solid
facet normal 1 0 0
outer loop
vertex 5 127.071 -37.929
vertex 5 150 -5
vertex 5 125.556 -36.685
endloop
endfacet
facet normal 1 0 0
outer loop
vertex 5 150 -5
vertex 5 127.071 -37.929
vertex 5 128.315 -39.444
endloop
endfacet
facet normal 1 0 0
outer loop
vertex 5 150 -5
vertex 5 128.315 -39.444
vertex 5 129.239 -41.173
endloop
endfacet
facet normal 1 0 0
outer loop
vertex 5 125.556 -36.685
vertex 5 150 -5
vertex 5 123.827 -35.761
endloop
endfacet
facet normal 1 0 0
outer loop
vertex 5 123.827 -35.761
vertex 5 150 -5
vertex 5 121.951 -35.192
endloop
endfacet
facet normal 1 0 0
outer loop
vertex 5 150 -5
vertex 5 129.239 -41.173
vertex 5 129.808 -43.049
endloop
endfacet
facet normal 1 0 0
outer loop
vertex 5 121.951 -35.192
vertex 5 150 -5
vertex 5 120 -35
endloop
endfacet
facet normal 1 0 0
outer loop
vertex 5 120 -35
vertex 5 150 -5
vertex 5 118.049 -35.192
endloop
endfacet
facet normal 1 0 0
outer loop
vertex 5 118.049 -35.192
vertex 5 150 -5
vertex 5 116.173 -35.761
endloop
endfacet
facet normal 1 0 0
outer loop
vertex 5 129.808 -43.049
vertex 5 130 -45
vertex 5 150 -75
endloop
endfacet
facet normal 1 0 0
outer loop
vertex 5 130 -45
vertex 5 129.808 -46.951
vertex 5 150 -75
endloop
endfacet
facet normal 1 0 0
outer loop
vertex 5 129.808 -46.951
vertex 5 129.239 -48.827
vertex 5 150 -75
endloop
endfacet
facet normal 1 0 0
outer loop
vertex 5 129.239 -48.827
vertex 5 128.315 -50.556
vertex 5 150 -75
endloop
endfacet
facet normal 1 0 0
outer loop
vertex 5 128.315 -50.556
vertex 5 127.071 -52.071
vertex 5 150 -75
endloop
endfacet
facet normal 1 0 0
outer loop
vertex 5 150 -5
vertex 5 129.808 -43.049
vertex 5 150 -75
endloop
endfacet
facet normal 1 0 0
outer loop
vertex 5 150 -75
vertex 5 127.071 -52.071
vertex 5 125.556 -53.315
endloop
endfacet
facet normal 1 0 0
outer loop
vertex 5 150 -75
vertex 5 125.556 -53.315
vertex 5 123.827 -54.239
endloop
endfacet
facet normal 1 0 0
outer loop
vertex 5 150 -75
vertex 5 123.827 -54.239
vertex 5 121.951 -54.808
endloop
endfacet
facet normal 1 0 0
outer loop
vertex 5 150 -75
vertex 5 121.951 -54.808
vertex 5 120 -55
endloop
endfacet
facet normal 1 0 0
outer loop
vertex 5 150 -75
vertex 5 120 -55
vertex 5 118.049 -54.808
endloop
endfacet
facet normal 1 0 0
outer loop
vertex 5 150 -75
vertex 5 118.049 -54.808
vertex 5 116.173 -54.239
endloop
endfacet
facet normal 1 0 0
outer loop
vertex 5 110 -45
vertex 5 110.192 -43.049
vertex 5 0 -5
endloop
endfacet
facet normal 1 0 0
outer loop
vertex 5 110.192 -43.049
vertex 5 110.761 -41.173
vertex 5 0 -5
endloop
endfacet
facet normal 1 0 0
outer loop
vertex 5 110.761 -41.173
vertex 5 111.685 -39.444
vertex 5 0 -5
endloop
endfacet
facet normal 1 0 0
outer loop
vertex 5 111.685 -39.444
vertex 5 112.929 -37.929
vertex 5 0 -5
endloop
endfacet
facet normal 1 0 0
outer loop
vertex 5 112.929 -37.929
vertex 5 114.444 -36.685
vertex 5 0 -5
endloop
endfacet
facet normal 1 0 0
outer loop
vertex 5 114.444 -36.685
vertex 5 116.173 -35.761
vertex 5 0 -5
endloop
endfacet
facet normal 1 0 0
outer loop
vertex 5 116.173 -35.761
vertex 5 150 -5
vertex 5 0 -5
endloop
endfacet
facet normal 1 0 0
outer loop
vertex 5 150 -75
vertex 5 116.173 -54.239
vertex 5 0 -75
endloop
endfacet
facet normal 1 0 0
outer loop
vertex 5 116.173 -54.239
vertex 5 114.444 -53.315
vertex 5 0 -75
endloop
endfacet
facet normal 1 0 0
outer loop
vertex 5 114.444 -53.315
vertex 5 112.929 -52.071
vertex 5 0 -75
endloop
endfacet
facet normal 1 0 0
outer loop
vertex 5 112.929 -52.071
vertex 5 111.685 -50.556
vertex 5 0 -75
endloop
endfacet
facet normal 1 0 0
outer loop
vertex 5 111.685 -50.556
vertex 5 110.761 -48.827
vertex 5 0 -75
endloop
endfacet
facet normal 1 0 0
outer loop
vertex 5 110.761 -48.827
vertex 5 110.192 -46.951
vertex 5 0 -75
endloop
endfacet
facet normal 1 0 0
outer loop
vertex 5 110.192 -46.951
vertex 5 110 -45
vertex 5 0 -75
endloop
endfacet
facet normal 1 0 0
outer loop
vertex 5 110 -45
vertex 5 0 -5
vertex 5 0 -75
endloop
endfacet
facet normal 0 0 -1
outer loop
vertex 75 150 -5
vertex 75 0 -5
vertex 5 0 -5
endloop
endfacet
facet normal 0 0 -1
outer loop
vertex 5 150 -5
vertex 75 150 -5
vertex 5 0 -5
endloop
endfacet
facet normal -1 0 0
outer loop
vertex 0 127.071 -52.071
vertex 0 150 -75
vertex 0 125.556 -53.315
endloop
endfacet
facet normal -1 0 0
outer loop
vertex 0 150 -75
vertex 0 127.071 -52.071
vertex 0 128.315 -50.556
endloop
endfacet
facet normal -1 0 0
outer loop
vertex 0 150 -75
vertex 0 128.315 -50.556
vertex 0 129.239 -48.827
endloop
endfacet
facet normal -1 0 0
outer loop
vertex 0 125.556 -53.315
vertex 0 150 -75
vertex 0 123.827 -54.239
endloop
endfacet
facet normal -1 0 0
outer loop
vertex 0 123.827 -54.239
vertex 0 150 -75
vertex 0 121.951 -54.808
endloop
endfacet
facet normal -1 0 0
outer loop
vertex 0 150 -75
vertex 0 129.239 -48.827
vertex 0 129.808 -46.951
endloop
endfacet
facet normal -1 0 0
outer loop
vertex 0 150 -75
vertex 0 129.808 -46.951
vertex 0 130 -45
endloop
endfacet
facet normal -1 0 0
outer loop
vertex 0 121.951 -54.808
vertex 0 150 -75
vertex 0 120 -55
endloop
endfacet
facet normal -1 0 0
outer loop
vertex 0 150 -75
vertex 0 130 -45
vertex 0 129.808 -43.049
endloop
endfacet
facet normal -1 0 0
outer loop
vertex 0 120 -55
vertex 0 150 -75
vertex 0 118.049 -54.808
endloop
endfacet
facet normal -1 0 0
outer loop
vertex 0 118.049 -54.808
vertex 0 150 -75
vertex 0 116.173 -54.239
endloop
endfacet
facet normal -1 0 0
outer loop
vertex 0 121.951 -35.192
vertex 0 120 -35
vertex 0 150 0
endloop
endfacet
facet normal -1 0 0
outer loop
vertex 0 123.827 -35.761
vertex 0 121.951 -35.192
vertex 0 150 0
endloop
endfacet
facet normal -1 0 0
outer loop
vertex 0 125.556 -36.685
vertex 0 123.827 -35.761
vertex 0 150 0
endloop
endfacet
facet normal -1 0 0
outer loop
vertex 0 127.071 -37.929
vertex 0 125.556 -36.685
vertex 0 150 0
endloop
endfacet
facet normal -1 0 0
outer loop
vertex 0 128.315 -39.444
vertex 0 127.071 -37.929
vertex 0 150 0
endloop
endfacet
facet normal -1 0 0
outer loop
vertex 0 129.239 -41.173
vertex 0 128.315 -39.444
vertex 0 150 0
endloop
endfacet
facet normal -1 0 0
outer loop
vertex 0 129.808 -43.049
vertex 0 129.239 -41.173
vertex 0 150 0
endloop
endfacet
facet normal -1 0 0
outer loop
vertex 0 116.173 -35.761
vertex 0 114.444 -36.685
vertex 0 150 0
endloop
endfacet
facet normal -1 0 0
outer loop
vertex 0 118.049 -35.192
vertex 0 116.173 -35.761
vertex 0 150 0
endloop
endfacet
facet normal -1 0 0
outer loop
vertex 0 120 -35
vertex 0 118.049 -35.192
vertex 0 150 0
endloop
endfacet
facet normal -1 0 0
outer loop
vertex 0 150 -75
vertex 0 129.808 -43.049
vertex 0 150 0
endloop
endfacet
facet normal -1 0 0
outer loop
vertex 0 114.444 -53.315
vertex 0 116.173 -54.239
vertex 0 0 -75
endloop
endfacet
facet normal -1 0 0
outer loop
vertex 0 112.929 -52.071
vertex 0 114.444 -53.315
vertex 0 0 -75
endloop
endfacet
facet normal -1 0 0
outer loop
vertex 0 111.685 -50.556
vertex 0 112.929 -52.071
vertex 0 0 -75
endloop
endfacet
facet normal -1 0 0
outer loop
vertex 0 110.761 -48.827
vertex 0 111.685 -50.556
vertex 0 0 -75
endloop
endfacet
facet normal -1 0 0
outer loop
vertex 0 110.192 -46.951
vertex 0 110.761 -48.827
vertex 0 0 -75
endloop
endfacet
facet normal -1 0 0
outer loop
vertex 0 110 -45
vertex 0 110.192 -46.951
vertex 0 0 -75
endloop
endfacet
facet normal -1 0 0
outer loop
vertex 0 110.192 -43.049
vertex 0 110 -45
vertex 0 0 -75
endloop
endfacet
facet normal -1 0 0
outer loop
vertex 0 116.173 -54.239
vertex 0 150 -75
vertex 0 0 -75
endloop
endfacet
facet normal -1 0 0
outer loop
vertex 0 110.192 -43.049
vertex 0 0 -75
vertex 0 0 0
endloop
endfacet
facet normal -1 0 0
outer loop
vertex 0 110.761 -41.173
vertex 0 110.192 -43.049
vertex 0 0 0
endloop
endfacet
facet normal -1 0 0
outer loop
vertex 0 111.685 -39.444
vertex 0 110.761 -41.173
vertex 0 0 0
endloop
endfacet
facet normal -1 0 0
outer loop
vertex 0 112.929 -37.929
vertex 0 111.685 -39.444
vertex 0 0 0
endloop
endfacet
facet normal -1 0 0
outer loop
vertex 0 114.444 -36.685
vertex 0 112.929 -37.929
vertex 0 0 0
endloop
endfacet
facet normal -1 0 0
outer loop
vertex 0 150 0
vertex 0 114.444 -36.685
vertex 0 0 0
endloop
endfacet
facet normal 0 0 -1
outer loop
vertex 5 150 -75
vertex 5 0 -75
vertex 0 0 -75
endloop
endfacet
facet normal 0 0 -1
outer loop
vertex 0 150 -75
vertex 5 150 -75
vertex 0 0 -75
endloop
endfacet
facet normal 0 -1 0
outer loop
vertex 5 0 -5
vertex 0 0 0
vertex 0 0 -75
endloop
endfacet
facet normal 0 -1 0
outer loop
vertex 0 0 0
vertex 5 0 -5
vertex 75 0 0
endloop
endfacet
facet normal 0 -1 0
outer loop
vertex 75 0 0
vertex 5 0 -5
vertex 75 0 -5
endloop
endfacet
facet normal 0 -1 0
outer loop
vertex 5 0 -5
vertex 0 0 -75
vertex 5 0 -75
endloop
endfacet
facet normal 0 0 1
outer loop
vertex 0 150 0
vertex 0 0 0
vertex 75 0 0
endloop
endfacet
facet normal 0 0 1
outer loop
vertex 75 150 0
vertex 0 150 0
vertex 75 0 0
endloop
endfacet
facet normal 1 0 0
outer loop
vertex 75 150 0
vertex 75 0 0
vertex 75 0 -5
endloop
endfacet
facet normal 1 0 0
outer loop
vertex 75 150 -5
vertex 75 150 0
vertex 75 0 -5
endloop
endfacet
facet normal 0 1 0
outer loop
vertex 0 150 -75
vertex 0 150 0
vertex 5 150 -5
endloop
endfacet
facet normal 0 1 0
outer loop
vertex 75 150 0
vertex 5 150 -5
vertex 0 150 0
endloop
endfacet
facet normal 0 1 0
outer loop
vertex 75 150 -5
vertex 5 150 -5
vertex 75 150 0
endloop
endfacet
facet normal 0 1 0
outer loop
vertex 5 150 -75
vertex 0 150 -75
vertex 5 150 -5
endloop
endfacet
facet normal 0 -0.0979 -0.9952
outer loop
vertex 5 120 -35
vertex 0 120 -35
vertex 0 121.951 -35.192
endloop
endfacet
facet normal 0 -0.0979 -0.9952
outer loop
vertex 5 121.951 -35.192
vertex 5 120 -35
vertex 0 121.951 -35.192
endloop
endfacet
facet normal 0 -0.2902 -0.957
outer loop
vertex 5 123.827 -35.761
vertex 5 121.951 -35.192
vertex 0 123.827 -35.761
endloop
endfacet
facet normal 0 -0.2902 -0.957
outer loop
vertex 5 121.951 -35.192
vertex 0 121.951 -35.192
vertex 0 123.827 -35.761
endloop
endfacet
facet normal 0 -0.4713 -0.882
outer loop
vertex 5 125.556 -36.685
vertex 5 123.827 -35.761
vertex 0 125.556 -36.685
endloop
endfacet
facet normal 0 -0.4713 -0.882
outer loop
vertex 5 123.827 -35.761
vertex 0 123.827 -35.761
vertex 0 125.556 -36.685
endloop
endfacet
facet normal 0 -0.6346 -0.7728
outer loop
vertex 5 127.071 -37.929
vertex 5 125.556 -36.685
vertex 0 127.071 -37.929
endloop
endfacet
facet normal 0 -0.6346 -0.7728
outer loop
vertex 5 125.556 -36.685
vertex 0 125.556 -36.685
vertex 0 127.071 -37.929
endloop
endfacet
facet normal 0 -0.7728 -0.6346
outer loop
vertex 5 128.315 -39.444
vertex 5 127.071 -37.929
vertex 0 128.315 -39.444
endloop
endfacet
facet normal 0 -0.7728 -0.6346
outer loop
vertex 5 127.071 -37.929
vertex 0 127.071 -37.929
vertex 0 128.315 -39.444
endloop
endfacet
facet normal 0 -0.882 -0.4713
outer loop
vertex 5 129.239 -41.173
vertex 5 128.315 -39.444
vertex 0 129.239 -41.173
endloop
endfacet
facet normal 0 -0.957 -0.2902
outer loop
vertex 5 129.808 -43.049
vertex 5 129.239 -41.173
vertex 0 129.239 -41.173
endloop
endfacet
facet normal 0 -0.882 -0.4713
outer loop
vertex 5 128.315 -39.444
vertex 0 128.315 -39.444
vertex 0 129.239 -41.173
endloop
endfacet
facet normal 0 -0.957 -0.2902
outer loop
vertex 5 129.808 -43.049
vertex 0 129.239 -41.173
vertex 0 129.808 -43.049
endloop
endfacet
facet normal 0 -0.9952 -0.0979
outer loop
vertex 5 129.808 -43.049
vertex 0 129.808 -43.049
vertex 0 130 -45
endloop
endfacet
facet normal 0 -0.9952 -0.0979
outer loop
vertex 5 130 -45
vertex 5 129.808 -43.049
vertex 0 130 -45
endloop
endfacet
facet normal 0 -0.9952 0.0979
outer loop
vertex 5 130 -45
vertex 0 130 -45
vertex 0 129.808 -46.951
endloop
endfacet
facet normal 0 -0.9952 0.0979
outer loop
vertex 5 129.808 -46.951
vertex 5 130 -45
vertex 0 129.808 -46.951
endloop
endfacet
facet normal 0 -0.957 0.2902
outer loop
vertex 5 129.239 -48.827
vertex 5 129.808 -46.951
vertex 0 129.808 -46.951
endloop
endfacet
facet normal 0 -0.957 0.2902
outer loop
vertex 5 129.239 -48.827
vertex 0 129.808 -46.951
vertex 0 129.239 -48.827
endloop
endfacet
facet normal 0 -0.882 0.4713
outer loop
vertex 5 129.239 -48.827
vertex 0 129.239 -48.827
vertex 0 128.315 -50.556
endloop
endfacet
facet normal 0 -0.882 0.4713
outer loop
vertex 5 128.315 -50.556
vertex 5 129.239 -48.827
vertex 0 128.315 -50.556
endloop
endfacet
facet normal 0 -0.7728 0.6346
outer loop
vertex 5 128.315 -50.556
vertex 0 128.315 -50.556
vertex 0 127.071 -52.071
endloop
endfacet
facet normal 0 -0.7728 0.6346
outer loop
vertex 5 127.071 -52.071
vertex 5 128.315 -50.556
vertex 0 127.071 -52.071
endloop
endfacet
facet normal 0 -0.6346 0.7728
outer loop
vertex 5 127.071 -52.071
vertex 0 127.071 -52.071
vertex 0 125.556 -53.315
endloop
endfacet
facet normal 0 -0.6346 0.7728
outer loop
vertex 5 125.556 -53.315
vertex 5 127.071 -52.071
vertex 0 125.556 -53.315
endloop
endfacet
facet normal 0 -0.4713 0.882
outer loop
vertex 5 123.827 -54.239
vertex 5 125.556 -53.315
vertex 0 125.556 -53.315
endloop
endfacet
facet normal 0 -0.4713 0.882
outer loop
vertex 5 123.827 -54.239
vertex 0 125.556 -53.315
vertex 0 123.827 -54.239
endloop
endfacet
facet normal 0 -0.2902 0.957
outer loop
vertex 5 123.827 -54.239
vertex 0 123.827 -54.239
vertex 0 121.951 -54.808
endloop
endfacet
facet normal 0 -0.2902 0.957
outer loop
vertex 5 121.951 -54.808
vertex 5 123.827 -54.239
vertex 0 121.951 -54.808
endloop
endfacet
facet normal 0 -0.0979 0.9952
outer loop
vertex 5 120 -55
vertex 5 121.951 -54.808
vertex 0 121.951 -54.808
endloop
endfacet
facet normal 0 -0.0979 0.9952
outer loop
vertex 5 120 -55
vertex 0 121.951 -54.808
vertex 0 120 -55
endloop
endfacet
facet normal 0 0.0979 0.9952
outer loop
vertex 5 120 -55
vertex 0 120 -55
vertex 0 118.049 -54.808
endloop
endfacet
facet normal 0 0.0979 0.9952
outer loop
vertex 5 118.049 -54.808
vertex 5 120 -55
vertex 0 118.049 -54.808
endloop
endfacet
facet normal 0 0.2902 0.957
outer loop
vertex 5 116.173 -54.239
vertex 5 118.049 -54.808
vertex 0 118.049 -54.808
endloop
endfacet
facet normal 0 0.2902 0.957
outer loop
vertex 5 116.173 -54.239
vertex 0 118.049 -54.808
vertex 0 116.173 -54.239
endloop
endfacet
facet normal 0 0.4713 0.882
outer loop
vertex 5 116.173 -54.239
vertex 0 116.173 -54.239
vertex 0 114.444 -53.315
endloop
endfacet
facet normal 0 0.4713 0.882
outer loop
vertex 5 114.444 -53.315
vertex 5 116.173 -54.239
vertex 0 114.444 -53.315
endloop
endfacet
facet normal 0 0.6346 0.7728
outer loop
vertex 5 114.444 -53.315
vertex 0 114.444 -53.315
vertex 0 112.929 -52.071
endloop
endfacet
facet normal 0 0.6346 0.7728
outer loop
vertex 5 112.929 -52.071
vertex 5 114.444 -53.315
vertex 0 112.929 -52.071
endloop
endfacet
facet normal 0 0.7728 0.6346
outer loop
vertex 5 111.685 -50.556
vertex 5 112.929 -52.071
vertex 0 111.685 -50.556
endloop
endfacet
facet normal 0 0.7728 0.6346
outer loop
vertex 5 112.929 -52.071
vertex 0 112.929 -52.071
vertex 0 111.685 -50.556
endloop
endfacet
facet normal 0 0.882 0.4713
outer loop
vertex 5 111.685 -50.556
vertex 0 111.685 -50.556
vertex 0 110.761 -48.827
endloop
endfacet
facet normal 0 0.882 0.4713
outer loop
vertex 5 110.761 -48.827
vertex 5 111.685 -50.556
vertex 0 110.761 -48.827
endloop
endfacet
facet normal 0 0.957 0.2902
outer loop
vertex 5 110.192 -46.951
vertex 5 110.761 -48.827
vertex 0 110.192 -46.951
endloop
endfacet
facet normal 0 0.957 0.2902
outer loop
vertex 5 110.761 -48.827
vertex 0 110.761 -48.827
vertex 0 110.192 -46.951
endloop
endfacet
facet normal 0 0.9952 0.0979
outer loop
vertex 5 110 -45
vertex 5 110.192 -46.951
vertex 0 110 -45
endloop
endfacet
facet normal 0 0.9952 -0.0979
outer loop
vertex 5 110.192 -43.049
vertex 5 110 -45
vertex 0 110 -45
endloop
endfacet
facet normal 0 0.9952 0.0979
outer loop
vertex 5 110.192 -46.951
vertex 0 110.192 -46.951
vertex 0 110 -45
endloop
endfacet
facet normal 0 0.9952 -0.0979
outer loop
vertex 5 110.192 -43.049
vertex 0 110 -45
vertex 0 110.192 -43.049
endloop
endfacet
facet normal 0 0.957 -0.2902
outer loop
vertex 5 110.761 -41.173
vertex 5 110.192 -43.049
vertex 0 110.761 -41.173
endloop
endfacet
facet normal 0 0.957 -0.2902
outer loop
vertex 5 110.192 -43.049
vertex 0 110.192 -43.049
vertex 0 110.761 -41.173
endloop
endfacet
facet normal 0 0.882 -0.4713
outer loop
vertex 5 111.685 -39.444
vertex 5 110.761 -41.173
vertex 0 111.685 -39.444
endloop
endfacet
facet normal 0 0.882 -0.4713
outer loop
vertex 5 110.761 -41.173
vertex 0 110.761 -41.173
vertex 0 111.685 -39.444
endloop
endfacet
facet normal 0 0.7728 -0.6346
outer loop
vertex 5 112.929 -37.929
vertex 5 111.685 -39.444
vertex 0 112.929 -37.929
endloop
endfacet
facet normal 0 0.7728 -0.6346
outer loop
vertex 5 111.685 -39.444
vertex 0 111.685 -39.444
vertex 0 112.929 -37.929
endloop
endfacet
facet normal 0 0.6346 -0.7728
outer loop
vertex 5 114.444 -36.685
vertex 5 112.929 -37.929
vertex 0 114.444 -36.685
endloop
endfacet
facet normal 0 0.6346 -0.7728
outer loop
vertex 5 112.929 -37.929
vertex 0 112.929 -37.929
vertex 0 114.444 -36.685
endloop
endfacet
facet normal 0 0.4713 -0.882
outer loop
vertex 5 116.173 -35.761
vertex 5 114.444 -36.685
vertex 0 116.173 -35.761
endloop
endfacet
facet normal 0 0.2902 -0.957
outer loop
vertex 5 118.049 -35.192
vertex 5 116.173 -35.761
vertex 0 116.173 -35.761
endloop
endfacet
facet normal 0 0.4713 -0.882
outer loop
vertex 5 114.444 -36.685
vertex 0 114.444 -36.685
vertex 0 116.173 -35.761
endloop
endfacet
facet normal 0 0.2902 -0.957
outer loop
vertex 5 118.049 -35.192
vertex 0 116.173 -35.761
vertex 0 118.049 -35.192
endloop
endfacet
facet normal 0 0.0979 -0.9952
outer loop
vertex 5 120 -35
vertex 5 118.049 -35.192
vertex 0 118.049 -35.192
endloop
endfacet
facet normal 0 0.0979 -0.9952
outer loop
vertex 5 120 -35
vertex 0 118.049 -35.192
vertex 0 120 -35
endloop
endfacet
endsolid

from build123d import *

# Parameters (mm, degrees)
EXTRUDE_1_DEPTH     = 150
SKETCH_2_R          = 10
CUT_EXTRUDE_1_DEPTH = 76


with BuildPart() as part:
    # Эскиз1 → Вытянуть-Тонкостенный1 (new body)
    with BuildSketch(Plane(origin=(0, 0, 0), x_dir=(1, 0, 0), z_dir=(0, 1, 0))):
        Polygon((0, 75), (0, 0), (75, 0), (75, 5), (5, 5), (5, 75), align=None)
    extrude(amount=EXTRUDE_1_DEPTH)

    # Эскиз2 → Вырез-Вытянуть1 (cut, through all)
    with BuildSketch(Plane.ZY):
        with Locations((-45, 120)):
            Circle(SKETCH_2_R)
    extrude(amount=-CUT_EXTRUDE_1_DEPTH, mode=Mode.SUBTRACT)


solid = part.part
